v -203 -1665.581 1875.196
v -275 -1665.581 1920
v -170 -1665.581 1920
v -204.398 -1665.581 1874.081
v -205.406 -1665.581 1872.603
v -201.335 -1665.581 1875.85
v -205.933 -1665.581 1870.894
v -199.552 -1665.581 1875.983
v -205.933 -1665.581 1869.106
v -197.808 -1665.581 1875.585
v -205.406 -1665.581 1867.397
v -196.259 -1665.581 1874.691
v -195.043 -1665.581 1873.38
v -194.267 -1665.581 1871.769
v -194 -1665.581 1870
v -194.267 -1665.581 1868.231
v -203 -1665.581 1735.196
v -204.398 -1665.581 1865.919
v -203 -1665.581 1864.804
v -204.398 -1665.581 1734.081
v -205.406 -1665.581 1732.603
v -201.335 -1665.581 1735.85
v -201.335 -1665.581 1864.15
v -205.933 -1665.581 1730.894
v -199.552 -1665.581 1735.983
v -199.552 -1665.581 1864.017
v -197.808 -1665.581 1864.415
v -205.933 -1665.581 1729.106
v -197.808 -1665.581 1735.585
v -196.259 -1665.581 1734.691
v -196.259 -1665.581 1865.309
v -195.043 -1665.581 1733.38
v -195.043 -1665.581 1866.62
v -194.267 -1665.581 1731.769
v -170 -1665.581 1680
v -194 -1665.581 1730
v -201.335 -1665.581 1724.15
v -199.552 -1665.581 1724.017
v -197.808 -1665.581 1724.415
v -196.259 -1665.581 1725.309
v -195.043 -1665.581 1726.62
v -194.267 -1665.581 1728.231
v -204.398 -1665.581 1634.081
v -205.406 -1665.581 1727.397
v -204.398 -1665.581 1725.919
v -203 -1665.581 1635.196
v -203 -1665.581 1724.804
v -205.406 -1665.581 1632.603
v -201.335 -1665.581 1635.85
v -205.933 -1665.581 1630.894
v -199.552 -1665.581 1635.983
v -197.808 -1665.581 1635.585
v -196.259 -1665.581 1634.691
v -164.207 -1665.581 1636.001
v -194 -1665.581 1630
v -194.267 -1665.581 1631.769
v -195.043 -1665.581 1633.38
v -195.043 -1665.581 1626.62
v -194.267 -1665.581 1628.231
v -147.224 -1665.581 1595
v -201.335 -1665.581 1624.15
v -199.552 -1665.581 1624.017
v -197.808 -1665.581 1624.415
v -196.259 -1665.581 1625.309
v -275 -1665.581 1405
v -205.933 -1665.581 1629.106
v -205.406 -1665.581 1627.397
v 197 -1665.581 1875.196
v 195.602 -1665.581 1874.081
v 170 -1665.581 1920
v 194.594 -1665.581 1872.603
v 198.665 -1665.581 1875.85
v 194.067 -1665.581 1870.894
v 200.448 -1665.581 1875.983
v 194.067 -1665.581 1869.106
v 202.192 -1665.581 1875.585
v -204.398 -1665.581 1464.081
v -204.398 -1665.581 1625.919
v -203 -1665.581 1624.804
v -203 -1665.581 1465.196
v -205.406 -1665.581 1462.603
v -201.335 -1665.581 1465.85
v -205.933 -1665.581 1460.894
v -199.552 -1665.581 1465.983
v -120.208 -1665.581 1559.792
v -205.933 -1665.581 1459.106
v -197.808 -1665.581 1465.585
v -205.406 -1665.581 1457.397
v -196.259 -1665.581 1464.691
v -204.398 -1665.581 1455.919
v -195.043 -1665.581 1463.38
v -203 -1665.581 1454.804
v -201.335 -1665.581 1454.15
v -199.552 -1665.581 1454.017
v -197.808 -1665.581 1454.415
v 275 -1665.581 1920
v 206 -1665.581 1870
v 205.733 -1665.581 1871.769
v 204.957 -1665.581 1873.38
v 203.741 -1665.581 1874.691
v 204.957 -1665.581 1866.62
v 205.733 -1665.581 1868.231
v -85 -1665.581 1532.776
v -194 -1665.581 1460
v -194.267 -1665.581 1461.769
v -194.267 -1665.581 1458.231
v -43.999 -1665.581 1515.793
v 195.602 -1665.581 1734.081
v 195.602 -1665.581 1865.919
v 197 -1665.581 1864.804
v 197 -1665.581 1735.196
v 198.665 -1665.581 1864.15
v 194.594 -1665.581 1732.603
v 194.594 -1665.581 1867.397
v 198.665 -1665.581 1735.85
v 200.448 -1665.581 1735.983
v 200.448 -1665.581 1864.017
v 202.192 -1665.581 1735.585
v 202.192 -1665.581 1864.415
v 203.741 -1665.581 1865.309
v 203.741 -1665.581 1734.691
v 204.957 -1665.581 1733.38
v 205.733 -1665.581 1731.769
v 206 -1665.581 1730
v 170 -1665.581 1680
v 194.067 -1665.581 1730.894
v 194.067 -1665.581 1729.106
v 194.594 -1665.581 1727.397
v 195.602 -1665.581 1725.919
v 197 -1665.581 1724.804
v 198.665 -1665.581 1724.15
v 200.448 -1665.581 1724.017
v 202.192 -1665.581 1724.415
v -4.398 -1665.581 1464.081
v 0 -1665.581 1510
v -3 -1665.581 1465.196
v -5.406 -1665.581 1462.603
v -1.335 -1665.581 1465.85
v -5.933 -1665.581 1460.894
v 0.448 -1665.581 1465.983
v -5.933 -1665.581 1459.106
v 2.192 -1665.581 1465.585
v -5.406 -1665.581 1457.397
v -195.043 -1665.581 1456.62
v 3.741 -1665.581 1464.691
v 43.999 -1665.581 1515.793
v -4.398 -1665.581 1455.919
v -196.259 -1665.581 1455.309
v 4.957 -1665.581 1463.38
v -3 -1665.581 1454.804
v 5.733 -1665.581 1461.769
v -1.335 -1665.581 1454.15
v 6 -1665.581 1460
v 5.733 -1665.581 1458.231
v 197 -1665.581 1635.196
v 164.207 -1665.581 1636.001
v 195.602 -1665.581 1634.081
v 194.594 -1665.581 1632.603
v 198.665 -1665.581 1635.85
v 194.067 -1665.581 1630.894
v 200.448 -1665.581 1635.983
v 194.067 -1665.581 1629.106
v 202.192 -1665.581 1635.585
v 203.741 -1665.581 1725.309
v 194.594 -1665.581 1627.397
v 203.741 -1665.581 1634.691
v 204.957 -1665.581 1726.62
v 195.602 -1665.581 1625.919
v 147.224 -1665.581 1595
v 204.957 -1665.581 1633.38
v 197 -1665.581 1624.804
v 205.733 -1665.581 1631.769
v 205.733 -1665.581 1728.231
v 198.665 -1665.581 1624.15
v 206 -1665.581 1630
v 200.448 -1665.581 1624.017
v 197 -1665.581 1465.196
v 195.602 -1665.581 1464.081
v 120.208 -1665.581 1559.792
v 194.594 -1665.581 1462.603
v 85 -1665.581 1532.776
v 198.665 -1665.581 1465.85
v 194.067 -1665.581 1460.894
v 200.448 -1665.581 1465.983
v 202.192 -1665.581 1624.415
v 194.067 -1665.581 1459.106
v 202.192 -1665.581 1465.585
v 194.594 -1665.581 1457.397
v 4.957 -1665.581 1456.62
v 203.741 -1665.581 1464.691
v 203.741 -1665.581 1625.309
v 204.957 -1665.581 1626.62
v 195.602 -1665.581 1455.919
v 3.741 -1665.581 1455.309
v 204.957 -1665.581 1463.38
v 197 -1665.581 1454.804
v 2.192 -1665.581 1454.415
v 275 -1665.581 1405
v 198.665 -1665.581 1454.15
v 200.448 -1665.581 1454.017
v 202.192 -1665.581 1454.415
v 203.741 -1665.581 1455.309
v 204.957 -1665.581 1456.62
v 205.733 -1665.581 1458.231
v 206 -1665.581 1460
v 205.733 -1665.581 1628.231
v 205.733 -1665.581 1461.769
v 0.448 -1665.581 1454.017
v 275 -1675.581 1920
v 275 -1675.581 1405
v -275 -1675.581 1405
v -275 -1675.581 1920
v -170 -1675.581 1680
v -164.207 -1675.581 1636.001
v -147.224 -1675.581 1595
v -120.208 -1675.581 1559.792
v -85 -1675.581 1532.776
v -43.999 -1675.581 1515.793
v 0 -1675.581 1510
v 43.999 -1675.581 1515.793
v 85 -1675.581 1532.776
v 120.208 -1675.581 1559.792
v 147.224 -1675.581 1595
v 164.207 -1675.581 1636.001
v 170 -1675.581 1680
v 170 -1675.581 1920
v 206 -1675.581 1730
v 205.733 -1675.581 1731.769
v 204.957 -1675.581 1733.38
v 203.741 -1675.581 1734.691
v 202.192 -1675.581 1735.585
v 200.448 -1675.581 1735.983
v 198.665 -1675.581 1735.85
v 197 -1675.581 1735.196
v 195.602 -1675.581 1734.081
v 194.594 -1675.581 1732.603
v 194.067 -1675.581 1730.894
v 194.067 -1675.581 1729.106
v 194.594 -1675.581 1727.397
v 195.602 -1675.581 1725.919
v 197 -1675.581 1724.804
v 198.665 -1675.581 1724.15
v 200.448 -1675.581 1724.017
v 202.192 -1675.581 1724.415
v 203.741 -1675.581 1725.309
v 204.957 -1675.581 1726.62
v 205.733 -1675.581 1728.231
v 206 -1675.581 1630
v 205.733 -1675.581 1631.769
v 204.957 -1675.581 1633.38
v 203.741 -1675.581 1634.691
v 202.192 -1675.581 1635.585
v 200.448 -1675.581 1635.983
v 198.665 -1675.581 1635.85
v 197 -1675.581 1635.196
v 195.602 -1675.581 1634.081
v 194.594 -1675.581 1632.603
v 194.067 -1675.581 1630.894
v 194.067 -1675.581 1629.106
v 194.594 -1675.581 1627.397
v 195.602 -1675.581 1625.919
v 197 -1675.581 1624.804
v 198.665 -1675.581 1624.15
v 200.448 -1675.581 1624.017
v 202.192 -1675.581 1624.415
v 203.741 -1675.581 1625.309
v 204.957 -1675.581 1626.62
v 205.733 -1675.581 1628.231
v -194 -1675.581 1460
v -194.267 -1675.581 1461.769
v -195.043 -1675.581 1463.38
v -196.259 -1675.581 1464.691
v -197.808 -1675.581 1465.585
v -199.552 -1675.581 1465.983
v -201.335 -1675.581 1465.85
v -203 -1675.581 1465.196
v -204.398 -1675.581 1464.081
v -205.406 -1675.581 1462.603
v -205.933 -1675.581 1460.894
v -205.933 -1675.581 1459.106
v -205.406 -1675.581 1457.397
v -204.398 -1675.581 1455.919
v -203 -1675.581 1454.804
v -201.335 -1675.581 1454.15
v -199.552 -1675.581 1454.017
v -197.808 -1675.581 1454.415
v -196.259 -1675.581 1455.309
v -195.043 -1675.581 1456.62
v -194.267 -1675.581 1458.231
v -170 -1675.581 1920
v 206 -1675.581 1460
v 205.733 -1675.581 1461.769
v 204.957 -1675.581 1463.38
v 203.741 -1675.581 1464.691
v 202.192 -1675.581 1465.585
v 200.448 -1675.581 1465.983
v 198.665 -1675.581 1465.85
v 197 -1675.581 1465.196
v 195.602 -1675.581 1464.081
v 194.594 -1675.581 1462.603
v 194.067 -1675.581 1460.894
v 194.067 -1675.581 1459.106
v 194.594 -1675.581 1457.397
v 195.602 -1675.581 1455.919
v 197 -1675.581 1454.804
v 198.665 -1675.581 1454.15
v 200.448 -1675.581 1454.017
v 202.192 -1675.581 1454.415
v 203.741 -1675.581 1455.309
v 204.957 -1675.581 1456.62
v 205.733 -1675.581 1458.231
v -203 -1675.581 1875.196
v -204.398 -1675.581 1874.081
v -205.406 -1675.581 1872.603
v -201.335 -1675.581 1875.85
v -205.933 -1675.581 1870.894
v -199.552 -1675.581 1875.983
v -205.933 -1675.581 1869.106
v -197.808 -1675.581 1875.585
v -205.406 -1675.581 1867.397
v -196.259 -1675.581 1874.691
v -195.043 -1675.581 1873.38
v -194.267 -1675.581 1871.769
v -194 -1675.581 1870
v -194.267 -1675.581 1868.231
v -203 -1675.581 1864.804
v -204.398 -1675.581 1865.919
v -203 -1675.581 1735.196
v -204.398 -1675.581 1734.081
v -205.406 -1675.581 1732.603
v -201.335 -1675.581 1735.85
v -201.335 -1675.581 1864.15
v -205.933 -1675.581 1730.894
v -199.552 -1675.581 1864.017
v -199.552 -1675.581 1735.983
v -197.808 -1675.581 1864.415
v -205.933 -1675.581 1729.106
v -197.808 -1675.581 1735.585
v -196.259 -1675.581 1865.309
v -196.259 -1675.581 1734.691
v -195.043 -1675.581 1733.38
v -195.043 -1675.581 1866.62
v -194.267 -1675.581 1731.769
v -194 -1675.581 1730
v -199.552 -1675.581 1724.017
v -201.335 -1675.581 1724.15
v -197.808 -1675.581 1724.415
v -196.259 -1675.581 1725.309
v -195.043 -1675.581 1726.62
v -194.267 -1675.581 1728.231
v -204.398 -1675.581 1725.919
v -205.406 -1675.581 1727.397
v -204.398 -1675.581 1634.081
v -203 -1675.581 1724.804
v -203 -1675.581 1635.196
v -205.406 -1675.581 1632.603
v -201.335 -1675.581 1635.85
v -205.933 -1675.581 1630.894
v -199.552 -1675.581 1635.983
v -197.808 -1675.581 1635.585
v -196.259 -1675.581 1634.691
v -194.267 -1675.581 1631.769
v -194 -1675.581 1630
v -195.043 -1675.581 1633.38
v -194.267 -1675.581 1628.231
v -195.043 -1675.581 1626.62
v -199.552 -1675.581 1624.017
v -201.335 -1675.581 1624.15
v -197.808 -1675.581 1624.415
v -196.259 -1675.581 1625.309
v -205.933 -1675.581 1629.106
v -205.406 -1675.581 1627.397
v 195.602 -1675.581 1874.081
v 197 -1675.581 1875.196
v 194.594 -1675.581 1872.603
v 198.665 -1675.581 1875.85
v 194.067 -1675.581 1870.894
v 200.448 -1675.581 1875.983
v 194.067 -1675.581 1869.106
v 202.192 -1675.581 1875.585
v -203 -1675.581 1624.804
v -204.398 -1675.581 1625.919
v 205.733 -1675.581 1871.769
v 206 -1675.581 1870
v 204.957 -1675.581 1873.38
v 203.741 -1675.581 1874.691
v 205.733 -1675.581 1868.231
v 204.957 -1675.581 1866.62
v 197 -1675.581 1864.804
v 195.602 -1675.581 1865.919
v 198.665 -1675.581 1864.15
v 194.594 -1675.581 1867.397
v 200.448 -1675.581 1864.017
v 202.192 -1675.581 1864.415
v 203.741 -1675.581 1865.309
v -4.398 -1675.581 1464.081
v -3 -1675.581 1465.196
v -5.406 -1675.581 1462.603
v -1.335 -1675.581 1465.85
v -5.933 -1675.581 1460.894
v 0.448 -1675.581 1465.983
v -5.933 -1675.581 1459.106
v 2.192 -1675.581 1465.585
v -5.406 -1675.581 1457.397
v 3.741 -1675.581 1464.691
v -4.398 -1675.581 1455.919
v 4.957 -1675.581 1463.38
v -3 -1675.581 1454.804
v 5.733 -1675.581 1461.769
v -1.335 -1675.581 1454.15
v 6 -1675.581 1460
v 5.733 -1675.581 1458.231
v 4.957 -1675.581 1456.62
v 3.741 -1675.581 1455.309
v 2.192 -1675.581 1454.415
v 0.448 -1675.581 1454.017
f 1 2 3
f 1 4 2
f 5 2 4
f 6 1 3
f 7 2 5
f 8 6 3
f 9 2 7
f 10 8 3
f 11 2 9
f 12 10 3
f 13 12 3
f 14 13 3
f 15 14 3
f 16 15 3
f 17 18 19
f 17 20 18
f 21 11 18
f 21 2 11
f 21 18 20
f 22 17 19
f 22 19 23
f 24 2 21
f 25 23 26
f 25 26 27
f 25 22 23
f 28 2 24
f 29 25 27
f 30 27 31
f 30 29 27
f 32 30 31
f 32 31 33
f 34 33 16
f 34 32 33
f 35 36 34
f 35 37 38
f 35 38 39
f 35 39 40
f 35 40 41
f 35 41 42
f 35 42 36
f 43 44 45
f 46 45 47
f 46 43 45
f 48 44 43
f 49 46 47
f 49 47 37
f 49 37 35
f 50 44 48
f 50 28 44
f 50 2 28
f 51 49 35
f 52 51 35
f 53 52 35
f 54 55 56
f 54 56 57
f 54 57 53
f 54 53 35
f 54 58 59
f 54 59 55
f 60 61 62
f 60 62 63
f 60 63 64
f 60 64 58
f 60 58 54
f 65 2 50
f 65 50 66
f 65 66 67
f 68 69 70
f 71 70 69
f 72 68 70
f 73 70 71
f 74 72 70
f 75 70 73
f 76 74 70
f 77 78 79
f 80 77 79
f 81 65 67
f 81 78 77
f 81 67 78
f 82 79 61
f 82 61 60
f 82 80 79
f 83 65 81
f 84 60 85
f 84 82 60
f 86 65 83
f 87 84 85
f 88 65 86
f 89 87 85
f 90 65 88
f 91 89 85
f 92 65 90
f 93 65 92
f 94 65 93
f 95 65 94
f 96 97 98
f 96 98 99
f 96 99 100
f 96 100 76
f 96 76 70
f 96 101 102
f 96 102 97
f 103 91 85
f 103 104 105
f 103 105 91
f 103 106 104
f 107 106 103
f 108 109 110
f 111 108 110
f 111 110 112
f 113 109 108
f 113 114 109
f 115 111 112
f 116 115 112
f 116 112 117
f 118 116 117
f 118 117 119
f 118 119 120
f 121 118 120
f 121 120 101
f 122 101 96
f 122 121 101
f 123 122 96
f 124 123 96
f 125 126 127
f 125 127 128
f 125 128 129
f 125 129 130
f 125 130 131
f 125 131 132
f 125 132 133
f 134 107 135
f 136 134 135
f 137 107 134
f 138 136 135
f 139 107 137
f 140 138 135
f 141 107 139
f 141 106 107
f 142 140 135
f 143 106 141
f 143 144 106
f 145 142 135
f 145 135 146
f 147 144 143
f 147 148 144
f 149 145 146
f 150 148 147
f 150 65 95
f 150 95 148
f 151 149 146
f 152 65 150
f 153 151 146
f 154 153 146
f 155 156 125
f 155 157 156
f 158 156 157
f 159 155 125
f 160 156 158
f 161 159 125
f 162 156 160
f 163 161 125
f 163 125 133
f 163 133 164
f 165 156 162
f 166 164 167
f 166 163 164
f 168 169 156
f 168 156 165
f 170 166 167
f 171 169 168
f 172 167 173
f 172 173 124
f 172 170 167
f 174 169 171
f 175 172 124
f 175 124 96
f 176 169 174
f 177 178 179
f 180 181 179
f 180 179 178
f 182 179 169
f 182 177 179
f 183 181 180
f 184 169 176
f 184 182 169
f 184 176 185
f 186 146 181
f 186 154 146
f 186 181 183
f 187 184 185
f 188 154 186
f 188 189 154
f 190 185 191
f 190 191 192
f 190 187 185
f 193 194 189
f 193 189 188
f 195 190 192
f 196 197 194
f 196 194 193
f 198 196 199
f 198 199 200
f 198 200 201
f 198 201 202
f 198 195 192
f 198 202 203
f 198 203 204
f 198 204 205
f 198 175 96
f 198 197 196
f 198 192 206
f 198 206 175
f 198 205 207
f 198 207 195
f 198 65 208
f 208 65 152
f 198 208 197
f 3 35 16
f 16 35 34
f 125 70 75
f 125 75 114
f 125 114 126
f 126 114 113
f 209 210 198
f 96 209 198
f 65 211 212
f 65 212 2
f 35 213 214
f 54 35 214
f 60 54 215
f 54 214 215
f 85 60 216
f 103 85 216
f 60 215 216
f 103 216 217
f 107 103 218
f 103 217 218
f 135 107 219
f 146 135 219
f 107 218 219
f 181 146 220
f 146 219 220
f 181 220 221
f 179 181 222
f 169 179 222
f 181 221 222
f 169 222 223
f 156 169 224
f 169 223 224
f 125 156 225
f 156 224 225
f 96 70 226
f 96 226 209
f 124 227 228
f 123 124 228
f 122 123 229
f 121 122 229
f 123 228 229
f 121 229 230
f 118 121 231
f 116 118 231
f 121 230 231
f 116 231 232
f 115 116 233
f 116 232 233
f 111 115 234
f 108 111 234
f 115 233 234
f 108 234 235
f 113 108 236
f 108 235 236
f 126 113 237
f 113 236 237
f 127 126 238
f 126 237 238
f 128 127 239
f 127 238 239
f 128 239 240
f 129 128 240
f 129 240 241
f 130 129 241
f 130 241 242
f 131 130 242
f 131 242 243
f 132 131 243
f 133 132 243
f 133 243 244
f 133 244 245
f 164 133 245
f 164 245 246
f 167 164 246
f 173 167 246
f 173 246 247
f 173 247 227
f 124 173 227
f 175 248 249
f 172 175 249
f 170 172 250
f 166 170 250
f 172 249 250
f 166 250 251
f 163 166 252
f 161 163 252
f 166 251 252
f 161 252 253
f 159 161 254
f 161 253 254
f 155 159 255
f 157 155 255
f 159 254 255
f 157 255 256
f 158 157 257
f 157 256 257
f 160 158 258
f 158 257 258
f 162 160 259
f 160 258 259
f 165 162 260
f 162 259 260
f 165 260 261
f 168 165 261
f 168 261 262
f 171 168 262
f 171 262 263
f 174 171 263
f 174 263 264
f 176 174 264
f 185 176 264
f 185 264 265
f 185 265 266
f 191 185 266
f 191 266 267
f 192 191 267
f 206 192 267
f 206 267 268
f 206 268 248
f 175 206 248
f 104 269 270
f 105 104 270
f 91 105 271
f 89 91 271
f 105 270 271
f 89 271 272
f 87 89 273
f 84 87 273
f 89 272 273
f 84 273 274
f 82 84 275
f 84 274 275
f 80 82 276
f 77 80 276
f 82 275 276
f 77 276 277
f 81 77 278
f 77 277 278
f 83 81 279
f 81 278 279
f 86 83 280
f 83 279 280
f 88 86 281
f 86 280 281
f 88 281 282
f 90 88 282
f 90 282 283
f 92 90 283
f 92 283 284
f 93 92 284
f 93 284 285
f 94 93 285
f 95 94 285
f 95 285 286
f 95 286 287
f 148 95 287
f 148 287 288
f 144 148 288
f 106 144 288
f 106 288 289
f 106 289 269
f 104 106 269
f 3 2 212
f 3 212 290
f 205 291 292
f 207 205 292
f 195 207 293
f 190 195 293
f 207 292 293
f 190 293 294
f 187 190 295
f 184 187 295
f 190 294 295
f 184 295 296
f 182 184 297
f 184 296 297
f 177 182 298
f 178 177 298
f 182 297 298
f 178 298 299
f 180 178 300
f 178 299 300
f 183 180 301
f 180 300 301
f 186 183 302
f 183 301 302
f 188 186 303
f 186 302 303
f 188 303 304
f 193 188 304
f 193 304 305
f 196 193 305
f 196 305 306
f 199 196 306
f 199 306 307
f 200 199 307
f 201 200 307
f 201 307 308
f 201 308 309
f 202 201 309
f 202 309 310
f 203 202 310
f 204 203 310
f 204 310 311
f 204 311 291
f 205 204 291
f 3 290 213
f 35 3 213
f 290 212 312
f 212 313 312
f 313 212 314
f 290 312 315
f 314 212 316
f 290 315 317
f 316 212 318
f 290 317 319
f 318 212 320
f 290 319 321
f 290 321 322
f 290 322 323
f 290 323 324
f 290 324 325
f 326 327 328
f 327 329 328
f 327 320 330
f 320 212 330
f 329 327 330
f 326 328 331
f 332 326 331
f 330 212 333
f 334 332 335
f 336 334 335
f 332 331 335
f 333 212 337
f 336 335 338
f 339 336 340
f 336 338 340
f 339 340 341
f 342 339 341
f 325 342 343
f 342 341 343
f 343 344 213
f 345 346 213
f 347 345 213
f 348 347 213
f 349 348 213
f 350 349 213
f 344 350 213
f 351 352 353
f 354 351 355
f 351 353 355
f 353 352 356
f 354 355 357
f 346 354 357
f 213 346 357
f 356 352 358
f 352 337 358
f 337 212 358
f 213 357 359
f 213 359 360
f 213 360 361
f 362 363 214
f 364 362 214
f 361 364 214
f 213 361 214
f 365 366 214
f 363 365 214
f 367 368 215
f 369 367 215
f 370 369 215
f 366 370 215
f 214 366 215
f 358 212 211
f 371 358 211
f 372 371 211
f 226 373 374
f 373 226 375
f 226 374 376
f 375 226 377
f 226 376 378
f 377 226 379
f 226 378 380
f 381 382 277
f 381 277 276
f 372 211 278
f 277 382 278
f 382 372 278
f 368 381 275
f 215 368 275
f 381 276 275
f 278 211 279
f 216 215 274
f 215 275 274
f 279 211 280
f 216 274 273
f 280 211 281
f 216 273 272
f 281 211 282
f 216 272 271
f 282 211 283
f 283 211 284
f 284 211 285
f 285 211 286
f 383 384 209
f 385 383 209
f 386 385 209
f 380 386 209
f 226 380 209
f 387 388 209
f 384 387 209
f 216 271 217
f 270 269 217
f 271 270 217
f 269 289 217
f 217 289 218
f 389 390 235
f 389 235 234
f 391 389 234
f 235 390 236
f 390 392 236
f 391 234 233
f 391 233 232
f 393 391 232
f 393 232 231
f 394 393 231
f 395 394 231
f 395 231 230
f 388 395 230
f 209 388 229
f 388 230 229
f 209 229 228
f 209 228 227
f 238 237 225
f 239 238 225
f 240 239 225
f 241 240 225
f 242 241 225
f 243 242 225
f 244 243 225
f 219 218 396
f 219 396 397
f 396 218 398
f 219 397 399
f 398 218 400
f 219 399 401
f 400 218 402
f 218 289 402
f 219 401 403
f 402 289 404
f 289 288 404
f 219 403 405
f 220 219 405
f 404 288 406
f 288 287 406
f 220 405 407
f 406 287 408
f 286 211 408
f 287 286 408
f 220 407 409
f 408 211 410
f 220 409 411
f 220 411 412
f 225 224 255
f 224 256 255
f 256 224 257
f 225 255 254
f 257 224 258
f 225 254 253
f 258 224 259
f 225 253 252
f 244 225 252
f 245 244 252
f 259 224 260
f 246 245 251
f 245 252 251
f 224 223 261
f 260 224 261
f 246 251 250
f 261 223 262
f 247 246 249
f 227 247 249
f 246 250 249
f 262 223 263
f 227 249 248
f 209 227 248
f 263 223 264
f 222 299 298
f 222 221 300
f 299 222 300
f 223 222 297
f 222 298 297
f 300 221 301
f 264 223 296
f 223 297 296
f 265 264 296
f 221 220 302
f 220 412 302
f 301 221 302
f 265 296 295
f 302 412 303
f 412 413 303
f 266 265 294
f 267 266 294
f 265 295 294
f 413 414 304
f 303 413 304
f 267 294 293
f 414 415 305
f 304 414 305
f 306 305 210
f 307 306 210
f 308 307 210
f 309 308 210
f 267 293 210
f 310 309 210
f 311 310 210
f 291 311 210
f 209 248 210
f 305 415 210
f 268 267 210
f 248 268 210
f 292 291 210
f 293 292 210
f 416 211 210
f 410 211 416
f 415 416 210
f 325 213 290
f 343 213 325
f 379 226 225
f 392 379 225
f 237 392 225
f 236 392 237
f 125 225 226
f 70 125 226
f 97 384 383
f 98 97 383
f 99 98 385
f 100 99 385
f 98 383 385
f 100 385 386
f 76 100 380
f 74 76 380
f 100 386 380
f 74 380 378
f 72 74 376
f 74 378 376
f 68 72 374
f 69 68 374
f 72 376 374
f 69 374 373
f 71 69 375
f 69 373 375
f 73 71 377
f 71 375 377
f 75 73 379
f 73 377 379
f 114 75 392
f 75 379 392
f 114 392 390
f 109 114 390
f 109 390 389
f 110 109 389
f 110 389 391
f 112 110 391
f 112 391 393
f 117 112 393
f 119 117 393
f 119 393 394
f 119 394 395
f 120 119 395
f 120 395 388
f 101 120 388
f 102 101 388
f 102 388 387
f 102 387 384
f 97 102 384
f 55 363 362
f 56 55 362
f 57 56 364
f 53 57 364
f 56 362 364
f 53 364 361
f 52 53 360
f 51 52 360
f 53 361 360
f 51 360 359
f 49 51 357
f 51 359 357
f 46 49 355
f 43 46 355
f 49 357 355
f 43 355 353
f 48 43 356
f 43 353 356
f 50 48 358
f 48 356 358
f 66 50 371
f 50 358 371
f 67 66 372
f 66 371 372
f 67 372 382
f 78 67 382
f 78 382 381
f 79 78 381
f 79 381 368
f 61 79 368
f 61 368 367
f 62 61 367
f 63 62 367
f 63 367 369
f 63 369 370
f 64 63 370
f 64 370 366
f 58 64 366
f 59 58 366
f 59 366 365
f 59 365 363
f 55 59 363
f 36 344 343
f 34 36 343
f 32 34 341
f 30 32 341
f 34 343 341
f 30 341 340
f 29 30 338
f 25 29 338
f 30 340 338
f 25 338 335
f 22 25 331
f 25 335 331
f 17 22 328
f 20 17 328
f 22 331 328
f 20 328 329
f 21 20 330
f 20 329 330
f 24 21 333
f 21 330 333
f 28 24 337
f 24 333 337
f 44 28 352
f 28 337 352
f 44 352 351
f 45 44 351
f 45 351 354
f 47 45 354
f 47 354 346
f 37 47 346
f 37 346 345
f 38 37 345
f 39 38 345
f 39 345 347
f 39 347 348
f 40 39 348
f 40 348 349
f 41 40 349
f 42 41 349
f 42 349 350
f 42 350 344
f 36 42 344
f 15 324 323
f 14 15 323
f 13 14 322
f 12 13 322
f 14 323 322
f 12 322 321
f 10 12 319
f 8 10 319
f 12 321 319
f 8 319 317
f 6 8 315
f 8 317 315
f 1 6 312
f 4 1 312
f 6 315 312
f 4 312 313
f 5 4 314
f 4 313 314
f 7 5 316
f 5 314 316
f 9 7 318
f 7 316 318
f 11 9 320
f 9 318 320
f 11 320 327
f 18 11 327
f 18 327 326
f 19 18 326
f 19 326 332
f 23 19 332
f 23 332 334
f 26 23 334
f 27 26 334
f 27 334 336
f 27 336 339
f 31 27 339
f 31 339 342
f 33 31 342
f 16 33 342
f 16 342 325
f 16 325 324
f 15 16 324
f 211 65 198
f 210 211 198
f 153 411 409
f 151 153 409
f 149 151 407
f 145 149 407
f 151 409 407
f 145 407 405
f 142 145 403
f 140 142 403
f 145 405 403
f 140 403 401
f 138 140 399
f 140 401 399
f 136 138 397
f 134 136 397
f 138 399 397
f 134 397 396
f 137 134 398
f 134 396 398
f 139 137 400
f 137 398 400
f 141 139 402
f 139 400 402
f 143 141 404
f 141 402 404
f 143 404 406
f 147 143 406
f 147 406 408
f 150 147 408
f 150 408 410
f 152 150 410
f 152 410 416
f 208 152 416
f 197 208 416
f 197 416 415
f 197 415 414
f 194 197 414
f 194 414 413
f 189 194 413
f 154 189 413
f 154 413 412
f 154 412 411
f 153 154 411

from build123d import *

# Parameters (mm, degrees)
SKETCH005_R      = 6
EXTRUDE004_DEPTH = 1000
EXTRUDE003_DEPTH = 1000
SKETCH003_W      = 550
SKETCH003_H      = 10
EXTRUDE002_DEPTH = 515


with BuildPart() as extrude004:
    # Sketch005 → Extrude004 (new body)
    with BuildSketch(Plane.XZ.offset(2500)):
        with Locations((-200, 1730)):
            Circle(SKETCH005_R)
        with Locations((-200, 1870)):
            Circle(SKETCH005_R)
        with Locations((200, 1870)):
            Circle(SKETCH005_R)
        with Locations((200, 1730)):
            Circle(SKETCH005_R)
        with Locations((-200, 1630)):
            Circle(SKETCH005_R)
        with Locations((-200, 1460)):
            Circle(SKETCH005_R)
        with Locations((200, 1630)):
            Circle(SKETCH005_R)
        with Locations((200, 1460)):
            Circle(SKETCH005_R)
        with Locations((0, 1460)):
            Circle(SKETCH005_R)
    extrude(amount=-EXTRUDE004_DEPTH)


with BuildPart() as extrude003:
    # Sketch004 → Extrude003 (new body)
    with BuildSketch(Plane.XZ.offset(2500)):
        with BuildLine():
            Line((-170, 1920), (-170, 1680))
            ThreePointArc((-170, 1680), (-4.8e-05, 1510), (170, 1679.999905))
            Line((170, 1679.999905), (170, 1920))
            Line((170, 1920), (-170, 1920))
        make_face()
    extrude(amount=-EXTRUDE003_DEPTH)


with BuildPart() as cut002:
    # Sketch003 → Extrude002 (new body)
    with BuildSketch(Plane.XY.offset(1405)):
        with Locations((0, -1670.580576)):
            Rectangle(SKETCH003_W, SKETCH003_H)
    extrude(amount=EXTRUDE002_DEPTH)

    # Cut001: cut Extrude003
    add(extrude003.part, mode=Mode.SUBTRACT)

    # Cut002: cut Extrude004
    add(extrude004.part, mode=Mode.SUBTRACT)


solid = cut002.part
